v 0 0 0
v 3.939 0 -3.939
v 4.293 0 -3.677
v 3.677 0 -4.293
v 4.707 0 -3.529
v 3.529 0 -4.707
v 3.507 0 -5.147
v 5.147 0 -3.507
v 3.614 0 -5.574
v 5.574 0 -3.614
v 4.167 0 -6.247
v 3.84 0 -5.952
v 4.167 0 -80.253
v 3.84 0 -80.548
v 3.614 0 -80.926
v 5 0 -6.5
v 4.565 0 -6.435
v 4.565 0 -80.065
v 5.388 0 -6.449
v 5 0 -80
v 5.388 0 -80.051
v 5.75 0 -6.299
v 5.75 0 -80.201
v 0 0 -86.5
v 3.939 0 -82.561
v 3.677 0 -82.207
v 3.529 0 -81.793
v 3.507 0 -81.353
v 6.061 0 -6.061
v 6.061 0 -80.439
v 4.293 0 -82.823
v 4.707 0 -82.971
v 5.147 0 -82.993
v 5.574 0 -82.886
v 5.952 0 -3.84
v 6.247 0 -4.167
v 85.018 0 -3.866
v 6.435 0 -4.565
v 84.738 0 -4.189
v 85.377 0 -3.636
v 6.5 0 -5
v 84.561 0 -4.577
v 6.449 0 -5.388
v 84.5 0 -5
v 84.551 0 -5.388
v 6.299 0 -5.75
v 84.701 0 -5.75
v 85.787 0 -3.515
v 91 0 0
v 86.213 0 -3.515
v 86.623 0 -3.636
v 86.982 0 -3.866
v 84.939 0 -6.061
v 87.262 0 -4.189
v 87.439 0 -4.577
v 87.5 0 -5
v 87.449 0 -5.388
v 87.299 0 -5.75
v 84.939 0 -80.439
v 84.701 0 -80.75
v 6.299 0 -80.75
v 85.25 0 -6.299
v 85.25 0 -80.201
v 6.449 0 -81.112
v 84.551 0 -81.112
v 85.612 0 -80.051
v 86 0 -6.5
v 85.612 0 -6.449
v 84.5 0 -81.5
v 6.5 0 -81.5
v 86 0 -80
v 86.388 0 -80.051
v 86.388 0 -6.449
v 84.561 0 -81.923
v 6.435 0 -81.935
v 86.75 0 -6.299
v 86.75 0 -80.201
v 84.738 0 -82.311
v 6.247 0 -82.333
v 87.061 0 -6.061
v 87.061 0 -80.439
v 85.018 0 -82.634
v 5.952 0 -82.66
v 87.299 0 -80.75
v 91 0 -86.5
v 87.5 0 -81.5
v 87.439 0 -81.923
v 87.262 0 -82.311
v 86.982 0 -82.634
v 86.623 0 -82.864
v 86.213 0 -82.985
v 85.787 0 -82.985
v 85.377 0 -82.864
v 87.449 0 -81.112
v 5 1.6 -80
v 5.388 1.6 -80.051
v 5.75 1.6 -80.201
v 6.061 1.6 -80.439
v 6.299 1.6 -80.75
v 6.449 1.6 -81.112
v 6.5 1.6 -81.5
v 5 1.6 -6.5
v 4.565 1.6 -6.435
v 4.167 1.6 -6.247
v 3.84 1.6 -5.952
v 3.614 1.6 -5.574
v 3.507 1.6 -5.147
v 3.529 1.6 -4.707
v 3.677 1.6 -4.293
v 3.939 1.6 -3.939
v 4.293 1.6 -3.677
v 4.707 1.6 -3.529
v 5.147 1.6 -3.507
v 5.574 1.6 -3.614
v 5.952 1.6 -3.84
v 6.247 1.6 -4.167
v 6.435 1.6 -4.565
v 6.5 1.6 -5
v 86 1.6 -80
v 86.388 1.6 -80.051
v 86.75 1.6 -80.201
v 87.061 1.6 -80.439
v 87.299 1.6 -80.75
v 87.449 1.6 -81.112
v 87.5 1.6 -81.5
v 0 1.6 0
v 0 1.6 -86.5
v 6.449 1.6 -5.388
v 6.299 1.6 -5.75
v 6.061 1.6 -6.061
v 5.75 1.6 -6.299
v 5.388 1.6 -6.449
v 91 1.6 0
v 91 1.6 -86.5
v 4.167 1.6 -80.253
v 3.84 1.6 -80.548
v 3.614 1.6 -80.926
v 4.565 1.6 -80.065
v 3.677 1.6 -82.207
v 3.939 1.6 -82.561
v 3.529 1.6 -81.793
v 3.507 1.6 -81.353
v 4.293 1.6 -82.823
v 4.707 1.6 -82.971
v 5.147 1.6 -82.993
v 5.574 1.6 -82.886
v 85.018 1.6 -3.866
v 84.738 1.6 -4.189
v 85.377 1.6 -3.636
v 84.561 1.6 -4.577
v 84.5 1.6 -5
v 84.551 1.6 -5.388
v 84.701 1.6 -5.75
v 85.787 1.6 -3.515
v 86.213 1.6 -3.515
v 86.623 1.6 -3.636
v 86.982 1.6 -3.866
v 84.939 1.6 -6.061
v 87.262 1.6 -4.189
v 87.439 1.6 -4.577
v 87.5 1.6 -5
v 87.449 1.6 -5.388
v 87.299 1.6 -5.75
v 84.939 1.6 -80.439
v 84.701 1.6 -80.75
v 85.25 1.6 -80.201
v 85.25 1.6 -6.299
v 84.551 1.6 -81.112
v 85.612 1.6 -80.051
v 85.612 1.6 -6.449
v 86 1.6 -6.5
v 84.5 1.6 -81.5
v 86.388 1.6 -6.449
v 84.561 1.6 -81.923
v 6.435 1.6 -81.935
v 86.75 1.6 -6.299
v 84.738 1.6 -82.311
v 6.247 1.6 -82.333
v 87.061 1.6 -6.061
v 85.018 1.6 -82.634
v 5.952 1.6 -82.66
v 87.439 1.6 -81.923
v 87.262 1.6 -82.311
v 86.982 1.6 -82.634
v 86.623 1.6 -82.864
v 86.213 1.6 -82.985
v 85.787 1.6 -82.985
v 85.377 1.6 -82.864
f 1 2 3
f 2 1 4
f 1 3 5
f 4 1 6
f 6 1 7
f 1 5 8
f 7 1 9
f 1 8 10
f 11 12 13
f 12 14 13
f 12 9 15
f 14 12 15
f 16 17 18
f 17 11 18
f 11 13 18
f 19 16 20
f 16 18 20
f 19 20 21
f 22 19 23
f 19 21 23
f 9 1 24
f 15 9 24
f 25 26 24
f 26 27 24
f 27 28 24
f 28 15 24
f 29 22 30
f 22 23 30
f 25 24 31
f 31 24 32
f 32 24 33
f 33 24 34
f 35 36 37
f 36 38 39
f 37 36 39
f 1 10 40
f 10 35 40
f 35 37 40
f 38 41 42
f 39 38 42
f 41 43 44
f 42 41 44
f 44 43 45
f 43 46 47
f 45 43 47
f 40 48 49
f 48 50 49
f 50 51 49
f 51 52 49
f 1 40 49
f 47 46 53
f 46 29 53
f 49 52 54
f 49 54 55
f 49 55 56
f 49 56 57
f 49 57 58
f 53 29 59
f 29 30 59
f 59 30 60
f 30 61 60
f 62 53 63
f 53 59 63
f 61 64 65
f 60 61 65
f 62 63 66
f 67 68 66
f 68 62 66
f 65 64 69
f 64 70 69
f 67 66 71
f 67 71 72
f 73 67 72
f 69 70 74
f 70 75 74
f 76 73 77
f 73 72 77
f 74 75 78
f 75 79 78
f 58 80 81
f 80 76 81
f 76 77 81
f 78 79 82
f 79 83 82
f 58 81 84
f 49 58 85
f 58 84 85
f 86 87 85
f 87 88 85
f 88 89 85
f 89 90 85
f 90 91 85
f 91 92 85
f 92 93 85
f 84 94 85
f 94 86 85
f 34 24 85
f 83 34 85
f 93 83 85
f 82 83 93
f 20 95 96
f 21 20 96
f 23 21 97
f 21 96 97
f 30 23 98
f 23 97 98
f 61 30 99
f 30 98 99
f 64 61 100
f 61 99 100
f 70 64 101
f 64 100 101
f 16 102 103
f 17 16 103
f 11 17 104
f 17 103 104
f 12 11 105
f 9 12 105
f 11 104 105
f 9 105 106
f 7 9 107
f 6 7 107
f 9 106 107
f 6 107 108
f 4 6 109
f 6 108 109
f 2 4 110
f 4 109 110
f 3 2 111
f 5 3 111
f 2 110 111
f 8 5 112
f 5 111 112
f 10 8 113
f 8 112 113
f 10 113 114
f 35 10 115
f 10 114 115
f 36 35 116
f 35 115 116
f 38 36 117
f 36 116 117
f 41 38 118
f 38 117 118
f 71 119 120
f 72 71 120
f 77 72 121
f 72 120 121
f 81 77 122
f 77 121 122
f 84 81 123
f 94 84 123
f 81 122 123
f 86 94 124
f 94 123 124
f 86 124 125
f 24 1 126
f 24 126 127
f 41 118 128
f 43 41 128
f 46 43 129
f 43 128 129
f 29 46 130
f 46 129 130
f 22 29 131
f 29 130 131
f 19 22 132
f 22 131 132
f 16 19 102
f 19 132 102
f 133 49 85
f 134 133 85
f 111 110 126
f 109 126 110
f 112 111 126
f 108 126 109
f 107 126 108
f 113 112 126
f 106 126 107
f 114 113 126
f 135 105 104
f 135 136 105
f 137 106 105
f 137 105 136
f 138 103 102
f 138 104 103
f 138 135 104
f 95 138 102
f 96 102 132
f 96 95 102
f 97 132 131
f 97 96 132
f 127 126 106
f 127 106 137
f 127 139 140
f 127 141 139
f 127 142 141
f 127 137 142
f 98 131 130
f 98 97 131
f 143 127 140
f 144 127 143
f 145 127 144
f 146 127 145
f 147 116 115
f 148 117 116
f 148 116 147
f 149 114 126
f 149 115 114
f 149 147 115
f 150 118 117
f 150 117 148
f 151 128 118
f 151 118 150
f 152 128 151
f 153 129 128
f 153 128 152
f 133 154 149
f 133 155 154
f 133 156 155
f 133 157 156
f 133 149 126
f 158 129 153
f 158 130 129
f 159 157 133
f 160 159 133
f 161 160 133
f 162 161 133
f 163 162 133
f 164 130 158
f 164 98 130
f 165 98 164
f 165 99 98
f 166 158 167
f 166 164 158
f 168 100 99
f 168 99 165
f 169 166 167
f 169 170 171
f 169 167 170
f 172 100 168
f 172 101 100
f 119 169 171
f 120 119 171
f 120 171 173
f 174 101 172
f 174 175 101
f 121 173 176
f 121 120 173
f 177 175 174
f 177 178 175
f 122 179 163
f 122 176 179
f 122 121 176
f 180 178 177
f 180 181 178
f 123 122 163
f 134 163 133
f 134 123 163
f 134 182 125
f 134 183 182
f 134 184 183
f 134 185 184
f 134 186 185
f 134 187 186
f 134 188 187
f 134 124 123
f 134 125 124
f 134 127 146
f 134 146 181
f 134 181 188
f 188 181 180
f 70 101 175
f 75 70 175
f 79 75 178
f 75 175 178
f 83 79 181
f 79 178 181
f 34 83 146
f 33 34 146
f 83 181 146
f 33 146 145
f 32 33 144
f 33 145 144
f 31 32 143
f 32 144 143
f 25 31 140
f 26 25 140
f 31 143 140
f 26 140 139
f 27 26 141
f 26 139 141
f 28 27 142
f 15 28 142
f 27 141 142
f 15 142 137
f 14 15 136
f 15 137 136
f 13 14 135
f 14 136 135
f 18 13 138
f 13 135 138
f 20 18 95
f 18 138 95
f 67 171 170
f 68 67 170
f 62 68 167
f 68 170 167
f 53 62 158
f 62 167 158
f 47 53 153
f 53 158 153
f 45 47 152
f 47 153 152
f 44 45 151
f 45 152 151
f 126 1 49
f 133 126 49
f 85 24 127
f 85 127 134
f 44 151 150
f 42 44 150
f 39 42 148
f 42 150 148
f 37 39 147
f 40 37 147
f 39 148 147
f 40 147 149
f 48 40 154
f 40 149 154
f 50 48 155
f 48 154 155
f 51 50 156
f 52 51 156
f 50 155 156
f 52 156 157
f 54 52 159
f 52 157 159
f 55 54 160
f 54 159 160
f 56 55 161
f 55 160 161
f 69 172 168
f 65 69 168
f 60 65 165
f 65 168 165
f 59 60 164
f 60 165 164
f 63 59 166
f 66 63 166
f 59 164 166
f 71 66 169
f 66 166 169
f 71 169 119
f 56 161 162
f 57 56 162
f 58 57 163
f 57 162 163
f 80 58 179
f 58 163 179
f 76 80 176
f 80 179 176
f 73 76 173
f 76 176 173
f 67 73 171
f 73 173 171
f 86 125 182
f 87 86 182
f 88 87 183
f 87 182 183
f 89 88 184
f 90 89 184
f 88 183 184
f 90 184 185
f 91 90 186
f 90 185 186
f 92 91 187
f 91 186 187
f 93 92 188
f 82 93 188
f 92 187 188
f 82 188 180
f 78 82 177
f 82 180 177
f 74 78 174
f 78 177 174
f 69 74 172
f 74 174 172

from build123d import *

# Parameters (mm, degrees)
SKETCH2_W          = 91
SKETCH2_H          = 86.5
PCB_DEPTH          = 1.6
CUT_EXTRUDE1_DEPTH = 10


with BuildPart() as part:
    # Sketch2 → PCB (new body)
    with BuildSketch(Plane(origin=(0, 0, 0), x_dir=(1, 0, 0), z_dir=(0, 1, 0))):
        with Locations((45.5, 43.25)):
            Rectangle(SKETCH2_W, SKETCH2_H)
    extrude(amount=PCB_DEPTH)

    # Sketch3 → Cut-Extrude1 (cut)
    with BuildSketch(Plane(origin=(0, 1.6, 0), x_dir=(1, 0, 0), z_dir=(0, 1, 0))):
        with BuildLine():
            ThreePointArc((6.5, 5), (6.060660172, 6.060660172), (5, 6.5))
            Line((5, 6.5), (5, 5))
            Line((5, 5), (6.5, 5))
        make_face()
        with BuildLine():
            Line((5, 5), (5, 6.5))
            ThreePointArc((5, 6.5), (3.939339828, 3.939339828), (6.5, 5))
            Line((6.5, 5), (5, 5))
        make_face()
        with BuildLine():
            ThreePointArc((86, 6.5), (84.939339828, 6.060660172), (84.5, 5))
            Line((84.5, 5), (86, 5))
            Line((86, 5), (86, 6.5))
        make_face()
        with BuildLine():
            Line((86, 5), (84.5, 5))
            ThreePointArc((84.5, 5), (86, 3.5), (87.5, 5))
            ThreePointArc((87.5, 5), (87.060660172, 6.060660172), (86, 6.5))
            Line((86, 6.5), (86, 5))
        make_face()
        with BuildLine():
            ThreePointArc((87.5, 81.5), (86, 83), (84.5, 81.5))
            Line((84.5, 81.5), (86, 81.5))
            Line((86, 81.5), (86, 80))
            ThreePointArc((86, 80), (87.060660172, 80.439339828), (87.5, 81.5))
        make_face()
        with BuildLine():
            Line((86, 81.5), (84.5, 81.5))
            ThreePointArc((84.5, 81.5), (84.939339828, 80.439339828), (86, 80))
            Line((86, 80), (86, 81.5))
        make_face()
        with BuildLine():
            Line((6.5, 81.5), (5, 81.5))
            Line((5, 81.5), (5, 80))
            ThreePointArc((5, 80), (6.060660172, 80.439339828), (6.5, 81.5))
        make_face()
        with BuildLine():
            Line((5, 80), (5, 81.5))
            Line((5, 81.5), (6.5, 81.5))
            ThreePointArc((6.5, 81.5), (3.939339828, 82.560660172), (5, 80))
        make_face()
    extrude(amount=-CUT_EXTRUDE1_DEPTH, mode=Mode.SUBTRACT)


solid = part.part
